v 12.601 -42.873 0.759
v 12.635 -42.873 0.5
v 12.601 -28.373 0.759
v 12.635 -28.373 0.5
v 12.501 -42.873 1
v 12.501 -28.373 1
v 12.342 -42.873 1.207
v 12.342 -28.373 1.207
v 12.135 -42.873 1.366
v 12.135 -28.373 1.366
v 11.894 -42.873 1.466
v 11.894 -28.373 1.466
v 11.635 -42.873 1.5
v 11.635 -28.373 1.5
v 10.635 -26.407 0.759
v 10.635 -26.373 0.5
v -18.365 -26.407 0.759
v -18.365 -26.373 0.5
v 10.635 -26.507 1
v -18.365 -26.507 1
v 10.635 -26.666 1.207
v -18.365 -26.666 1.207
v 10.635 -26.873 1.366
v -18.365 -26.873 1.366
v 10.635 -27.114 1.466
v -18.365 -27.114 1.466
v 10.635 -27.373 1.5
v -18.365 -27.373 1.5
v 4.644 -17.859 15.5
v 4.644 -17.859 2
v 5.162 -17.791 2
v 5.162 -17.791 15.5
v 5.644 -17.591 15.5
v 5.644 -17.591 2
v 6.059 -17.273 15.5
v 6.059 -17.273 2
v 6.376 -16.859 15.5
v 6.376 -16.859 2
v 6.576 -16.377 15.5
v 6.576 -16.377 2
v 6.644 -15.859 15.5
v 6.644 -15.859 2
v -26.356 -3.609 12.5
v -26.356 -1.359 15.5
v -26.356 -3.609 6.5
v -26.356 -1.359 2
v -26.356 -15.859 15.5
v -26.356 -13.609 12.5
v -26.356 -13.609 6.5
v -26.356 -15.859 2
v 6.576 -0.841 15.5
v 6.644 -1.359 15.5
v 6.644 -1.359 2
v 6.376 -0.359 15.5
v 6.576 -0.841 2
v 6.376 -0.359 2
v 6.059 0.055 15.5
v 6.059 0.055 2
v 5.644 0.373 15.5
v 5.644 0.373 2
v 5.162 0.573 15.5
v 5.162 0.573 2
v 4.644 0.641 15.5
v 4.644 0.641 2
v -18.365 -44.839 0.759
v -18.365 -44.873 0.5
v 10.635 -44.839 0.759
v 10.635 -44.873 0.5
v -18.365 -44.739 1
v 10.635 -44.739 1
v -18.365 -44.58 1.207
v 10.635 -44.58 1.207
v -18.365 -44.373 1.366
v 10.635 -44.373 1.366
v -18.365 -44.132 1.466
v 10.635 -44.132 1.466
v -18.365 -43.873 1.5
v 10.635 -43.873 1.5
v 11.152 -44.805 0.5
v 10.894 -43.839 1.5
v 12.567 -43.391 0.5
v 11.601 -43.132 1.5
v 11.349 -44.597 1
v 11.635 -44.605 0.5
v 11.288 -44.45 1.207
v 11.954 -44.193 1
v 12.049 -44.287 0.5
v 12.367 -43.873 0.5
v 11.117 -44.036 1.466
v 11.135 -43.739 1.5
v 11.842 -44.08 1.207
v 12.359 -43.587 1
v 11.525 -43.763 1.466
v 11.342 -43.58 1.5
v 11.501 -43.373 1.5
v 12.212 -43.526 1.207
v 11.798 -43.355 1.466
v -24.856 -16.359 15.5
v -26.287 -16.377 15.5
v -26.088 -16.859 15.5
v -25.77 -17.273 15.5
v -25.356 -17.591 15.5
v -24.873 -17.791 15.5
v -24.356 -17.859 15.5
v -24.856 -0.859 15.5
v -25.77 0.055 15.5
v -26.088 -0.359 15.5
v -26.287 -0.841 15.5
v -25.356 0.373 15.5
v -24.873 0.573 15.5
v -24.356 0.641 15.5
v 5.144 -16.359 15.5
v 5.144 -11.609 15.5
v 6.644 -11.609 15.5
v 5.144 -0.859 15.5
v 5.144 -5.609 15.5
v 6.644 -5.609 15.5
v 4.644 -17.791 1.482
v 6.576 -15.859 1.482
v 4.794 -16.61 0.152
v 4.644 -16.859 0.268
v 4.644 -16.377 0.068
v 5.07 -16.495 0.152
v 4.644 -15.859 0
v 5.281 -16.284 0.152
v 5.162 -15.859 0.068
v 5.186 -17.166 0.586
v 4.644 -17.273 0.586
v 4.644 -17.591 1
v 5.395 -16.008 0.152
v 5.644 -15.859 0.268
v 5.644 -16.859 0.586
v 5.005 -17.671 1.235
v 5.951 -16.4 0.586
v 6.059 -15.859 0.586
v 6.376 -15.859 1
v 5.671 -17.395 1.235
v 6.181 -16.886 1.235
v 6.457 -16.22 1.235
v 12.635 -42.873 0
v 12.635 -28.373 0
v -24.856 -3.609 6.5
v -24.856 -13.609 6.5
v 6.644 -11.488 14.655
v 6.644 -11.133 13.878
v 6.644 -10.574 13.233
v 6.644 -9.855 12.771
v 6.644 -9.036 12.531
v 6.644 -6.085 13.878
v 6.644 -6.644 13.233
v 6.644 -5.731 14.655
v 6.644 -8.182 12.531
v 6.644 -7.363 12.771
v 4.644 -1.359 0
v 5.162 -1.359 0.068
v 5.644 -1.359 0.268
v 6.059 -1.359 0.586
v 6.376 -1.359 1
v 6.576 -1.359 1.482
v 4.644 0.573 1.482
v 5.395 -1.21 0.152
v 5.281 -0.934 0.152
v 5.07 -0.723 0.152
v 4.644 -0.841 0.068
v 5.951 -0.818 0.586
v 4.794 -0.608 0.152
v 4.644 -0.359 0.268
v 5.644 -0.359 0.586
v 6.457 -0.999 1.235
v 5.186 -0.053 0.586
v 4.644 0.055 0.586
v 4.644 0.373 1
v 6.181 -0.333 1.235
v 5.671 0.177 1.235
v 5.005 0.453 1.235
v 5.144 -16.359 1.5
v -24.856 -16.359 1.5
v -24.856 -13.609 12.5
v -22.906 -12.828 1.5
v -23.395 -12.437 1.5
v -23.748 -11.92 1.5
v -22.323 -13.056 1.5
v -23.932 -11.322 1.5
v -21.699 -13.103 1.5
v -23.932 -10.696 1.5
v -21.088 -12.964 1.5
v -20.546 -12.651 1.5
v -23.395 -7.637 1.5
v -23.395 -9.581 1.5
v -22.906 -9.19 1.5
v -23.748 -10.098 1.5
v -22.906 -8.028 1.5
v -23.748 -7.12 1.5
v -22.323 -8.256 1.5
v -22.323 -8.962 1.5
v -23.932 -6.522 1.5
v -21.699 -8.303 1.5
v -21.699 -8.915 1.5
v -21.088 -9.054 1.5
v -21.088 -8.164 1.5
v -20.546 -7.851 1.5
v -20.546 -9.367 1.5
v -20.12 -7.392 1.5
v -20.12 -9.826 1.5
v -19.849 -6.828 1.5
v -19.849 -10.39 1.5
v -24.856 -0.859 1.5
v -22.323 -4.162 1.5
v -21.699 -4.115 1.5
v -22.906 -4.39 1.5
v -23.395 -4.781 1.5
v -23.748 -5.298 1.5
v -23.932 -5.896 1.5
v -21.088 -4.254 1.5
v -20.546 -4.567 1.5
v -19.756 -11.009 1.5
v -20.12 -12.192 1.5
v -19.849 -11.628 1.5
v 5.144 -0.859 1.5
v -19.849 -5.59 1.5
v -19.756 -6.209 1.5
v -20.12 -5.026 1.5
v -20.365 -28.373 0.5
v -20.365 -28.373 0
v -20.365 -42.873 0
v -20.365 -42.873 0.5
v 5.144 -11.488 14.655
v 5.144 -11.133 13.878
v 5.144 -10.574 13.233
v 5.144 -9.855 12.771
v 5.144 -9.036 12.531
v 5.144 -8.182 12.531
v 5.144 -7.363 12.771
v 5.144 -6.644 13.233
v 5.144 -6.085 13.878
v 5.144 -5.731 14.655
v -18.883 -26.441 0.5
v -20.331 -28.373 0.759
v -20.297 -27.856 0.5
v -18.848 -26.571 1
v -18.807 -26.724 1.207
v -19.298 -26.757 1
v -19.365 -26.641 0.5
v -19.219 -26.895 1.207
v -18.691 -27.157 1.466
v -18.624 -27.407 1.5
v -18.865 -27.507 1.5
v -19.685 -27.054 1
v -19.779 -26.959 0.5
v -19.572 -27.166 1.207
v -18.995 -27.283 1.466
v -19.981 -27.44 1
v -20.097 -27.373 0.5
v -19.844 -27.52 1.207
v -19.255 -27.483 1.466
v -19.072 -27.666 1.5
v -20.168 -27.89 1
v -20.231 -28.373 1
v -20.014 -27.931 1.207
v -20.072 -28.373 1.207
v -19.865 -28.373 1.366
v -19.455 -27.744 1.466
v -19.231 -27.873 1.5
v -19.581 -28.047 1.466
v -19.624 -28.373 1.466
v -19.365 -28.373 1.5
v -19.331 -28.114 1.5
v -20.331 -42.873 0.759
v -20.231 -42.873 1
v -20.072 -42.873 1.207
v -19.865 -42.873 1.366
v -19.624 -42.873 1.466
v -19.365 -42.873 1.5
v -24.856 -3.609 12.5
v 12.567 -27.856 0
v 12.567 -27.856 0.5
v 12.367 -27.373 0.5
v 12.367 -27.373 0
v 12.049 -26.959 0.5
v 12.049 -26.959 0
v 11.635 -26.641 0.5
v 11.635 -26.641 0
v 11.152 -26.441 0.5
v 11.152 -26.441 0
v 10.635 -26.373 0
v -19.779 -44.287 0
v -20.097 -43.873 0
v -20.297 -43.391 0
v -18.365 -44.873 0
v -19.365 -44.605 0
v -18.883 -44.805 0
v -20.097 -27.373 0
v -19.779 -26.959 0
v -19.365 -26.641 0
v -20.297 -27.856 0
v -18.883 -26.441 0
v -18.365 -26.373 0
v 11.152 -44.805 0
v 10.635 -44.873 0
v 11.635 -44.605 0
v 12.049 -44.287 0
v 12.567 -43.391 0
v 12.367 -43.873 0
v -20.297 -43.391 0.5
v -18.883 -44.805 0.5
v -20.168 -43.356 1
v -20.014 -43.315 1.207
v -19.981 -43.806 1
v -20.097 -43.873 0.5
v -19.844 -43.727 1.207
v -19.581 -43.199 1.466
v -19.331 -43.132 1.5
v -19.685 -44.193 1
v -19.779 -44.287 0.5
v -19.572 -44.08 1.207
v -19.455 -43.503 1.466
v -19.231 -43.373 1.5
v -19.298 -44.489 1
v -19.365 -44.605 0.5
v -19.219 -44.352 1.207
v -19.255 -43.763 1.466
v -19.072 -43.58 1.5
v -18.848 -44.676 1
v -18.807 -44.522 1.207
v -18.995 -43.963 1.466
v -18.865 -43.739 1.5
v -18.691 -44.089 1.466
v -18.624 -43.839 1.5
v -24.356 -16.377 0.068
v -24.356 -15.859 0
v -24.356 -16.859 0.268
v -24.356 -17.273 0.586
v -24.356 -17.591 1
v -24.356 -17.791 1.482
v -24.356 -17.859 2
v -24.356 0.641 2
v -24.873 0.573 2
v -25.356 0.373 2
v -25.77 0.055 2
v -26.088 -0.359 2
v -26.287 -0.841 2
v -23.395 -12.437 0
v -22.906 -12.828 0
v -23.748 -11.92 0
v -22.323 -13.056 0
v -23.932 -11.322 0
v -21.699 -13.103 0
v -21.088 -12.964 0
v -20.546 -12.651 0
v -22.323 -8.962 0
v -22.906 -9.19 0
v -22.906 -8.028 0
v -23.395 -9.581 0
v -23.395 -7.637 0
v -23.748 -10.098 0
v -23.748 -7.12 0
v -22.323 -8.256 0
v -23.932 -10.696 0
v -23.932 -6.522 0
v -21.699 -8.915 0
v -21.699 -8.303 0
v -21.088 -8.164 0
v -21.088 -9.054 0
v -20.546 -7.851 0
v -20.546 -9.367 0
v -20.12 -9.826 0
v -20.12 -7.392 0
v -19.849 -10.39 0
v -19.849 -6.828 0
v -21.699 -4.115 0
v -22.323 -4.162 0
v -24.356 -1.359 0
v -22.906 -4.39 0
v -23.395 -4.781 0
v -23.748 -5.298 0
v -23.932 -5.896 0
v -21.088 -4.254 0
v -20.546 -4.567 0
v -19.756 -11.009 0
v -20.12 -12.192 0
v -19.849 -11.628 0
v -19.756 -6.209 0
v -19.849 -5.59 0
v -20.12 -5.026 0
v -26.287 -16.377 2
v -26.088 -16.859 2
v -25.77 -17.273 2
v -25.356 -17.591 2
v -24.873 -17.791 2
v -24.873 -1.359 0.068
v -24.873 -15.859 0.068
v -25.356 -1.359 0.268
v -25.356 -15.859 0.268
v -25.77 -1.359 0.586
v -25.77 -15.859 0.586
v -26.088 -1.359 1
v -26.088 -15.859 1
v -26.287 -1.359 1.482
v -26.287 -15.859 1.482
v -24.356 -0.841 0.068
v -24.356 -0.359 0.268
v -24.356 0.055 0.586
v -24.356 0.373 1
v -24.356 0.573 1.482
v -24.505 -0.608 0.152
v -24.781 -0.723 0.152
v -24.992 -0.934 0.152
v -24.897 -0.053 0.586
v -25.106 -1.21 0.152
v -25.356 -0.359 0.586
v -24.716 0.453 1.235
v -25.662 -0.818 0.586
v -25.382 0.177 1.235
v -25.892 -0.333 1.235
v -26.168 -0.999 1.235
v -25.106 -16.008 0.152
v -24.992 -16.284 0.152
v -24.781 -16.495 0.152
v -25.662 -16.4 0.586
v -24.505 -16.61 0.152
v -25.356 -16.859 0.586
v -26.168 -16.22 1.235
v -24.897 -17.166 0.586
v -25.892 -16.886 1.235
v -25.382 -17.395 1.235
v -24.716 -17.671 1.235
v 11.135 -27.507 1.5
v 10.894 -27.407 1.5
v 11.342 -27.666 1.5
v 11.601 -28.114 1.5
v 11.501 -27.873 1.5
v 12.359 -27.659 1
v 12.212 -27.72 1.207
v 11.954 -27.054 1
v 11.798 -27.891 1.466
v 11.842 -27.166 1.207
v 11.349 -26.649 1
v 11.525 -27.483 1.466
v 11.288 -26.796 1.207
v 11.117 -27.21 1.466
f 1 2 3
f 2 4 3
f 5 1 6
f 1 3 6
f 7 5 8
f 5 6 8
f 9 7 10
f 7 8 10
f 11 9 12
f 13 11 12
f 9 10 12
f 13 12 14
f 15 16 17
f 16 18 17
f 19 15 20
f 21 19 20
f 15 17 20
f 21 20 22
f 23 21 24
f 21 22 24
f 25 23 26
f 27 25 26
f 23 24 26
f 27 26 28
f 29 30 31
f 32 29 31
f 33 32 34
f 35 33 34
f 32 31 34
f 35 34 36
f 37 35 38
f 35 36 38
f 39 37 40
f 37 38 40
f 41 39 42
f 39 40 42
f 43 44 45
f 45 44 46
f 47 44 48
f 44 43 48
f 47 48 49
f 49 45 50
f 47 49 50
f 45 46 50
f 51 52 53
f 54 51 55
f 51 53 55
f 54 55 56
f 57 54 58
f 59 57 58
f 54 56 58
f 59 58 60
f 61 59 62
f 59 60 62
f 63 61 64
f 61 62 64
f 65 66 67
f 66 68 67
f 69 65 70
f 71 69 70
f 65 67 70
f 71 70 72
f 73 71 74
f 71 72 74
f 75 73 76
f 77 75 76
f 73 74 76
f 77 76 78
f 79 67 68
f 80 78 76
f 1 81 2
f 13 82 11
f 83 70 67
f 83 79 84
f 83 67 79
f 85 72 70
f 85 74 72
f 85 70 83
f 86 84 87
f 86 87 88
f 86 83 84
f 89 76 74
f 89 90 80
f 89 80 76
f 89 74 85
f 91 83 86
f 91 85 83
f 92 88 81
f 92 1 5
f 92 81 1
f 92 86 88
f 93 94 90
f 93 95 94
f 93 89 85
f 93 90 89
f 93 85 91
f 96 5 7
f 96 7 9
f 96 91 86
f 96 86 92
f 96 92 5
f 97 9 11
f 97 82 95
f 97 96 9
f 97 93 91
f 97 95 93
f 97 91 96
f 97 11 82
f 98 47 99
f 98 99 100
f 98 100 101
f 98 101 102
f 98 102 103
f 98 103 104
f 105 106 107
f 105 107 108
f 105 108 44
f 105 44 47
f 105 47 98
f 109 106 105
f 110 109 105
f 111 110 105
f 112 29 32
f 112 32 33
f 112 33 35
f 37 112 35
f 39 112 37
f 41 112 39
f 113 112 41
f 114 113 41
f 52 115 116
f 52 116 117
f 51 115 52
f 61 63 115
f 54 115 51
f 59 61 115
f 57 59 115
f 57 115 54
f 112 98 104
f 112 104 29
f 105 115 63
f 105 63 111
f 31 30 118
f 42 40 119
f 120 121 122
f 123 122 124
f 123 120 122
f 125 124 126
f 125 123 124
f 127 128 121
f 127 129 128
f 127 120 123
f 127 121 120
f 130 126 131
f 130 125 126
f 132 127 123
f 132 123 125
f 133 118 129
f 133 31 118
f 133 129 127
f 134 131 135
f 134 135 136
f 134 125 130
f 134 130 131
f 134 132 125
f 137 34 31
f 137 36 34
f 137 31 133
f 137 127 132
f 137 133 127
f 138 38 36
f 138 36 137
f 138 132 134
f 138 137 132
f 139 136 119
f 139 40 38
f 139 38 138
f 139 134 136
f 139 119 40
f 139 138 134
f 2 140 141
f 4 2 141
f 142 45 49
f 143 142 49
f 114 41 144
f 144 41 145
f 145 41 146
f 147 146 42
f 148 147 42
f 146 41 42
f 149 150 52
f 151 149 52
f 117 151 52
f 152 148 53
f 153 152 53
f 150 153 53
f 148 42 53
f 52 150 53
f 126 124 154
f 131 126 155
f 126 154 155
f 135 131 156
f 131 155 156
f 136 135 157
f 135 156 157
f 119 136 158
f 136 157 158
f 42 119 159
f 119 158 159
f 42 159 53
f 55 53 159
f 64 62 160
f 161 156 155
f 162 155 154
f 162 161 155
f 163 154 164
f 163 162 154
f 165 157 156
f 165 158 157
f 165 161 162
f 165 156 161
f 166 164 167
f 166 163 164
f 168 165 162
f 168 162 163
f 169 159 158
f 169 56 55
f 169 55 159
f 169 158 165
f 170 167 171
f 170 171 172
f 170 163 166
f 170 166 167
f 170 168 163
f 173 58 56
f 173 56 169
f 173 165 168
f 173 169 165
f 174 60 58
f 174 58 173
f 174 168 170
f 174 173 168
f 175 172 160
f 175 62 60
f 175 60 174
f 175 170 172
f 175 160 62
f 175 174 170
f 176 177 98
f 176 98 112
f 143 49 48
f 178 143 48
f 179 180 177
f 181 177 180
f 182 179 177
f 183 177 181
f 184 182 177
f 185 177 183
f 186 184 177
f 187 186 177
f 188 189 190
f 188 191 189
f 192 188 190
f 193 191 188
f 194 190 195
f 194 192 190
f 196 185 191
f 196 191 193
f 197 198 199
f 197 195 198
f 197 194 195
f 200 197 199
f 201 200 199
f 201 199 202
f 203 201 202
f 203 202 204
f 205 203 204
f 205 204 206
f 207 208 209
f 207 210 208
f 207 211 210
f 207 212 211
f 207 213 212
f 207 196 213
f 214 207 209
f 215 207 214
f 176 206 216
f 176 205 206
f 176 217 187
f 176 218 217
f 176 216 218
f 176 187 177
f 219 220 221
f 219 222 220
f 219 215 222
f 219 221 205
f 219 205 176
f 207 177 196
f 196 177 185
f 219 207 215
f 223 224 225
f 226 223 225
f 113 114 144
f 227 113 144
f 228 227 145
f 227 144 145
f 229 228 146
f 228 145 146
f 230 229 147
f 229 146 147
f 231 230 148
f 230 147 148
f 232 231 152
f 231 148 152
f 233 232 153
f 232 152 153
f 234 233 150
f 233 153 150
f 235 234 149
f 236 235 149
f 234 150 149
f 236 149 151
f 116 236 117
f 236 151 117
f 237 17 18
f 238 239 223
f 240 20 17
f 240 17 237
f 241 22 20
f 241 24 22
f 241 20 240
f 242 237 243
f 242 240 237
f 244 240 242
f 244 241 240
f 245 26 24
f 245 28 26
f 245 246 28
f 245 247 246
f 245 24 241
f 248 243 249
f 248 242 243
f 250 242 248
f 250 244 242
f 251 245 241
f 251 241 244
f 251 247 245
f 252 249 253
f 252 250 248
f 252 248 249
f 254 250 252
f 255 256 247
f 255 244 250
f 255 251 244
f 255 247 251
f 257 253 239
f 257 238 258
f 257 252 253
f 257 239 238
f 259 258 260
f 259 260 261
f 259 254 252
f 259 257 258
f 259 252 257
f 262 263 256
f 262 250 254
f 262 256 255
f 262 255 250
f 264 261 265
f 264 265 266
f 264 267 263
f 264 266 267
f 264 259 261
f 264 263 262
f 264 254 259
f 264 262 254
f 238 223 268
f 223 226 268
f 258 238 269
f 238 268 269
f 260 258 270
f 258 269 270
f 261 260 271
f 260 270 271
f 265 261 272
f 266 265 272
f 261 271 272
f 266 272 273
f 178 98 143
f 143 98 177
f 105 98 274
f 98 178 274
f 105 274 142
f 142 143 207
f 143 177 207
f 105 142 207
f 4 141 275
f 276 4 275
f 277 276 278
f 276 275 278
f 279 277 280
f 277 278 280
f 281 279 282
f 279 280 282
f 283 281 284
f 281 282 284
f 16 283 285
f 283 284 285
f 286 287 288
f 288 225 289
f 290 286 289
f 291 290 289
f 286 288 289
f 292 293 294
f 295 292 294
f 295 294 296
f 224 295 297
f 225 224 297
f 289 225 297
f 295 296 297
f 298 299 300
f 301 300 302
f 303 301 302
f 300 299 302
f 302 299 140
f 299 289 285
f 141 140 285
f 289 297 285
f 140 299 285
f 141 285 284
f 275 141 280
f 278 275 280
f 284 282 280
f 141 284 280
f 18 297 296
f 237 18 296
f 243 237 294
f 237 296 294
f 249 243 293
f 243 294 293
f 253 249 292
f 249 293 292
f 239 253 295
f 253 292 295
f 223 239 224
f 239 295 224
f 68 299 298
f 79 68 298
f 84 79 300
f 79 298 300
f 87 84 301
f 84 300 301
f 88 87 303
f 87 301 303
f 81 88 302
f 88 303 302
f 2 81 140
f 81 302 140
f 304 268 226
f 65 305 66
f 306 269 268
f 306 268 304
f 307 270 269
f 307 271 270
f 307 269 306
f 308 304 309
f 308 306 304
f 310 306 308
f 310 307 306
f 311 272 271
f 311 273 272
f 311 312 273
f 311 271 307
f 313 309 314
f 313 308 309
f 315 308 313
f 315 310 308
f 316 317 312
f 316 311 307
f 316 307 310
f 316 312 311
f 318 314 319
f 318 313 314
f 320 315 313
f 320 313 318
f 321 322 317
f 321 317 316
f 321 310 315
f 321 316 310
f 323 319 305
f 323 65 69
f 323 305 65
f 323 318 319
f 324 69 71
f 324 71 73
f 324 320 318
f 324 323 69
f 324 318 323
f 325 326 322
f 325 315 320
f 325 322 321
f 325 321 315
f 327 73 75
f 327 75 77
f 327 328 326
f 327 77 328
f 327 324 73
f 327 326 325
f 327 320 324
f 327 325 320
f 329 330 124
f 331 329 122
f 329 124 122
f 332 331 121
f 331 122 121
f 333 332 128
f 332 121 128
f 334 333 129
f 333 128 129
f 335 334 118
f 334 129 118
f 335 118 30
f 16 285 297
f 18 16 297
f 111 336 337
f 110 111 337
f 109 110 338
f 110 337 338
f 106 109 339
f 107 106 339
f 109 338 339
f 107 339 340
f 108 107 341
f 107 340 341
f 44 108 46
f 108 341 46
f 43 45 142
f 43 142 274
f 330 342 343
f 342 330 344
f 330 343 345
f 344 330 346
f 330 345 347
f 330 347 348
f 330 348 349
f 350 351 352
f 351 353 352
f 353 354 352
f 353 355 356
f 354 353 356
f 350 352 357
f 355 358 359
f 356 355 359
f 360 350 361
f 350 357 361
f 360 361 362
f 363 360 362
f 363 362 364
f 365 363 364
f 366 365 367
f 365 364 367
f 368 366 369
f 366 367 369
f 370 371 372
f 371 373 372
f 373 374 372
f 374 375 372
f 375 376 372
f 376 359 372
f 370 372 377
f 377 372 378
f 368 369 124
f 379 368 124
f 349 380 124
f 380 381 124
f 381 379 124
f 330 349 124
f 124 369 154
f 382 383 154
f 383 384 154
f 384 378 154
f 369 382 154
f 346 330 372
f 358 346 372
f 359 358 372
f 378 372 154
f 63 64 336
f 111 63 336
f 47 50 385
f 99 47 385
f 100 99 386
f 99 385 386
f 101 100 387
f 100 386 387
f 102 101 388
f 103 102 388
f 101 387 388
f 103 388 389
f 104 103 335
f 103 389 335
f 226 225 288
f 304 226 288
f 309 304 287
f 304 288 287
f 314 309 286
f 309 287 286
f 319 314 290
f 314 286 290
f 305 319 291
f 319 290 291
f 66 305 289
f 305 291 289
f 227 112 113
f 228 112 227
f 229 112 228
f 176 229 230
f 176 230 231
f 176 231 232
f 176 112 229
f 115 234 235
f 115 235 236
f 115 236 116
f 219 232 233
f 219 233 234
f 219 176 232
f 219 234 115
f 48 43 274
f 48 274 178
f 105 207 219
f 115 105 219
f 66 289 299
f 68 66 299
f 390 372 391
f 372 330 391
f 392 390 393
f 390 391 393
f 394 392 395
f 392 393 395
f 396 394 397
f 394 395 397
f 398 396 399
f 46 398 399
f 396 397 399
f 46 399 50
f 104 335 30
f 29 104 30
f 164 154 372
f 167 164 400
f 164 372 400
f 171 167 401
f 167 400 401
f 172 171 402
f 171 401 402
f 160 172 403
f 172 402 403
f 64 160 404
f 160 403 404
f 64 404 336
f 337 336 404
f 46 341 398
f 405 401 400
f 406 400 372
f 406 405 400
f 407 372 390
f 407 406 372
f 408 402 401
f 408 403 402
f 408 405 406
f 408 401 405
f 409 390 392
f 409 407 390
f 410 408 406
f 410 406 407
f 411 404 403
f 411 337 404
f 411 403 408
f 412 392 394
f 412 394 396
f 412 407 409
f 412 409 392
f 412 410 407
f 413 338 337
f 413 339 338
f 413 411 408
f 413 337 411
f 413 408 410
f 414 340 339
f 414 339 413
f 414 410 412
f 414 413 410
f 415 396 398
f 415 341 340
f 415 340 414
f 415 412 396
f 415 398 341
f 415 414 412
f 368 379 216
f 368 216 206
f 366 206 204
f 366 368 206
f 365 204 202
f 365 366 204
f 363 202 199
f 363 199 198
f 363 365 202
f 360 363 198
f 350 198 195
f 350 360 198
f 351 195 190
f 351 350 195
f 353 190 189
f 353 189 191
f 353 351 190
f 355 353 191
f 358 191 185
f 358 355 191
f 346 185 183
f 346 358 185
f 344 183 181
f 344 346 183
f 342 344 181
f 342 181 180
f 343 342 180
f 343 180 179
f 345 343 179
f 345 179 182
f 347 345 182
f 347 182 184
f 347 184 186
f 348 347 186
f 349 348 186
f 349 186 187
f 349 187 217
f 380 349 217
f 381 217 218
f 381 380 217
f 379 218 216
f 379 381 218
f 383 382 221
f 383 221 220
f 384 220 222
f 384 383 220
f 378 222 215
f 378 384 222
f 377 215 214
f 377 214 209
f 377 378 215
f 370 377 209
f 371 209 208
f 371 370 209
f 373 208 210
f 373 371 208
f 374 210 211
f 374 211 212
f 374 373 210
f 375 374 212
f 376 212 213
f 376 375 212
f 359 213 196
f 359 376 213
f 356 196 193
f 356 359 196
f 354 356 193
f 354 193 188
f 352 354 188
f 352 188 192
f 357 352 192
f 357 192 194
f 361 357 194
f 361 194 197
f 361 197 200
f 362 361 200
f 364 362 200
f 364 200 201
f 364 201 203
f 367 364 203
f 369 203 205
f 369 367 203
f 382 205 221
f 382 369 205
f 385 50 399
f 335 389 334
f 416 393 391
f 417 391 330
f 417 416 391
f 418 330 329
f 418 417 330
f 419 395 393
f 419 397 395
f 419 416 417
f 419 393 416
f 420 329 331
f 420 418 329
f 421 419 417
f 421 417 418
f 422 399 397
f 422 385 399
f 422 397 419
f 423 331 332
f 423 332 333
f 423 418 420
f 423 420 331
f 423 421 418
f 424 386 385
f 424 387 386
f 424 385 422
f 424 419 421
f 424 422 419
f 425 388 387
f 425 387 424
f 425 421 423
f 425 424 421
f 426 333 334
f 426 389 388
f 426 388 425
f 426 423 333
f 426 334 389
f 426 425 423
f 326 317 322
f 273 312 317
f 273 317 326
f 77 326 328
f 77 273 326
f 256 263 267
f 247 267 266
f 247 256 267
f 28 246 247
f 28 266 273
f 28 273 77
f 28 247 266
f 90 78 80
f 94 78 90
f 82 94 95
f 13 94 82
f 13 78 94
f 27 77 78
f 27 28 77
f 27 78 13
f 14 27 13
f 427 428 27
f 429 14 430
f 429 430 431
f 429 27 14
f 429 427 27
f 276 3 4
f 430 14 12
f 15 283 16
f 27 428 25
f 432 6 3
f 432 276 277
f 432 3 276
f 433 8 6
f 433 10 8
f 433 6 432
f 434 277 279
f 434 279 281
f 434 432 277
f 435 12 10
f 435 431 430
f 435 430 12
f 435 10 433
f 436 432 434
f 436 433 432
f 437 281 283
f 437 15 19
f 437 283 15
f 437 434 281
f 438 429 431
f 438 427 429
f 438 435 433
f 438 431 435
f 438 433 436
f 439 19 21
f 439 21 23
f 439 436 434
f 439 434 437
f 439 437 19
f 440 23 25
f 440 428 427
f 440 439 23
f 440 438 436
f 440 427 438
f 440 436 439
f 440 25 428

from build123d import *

# Parameters (mm, degrees)
F0_W      = 30
F0_H      = 15.5
F1_DEPTH  = 15.5
F0_R      = 2.1
F2_DEPTH  = 1.5
F3_W      = 10
F3_H      = 6
F4_DEPTH  = 2
F6_DEPTH  = 1.5
F7_R      = 1
F8_R      = 2
F10_DEPTH = 2


with BuildPart() as f1:
    # F0 (on Top) → F1 (new body)
    with BuildSketch(Plane.XY):
        with BuildLine():
            Line((-26.3555888087, -1.3590702893), (-26.3555888087, -15.8590702893))
            ThreePointArc((-26.3555888087, -15.8590702893), (-25.769802371, -17.2732838517), (-24.3555888087, -17.8590702893))
            Line((-24.3555888087, -17.8590702893), (4.6444111913, -17.8590702893))
            ThreePointArc((4.6444111913, -17.8590702893), (6.0586247537, -17.2732838517), (6.6444111913, -15.8590702893))
            Line((6.6444111913, -15.8590702893), (6.6444111913, -1.3590702893))
            ThreePointArc((6.6444111913, -1.3590702893), (6.0586247537, 0.0551432731), (4.6444111913, 0.6409297107))
            Line((4.6444111913, 0.6409297107), (-24.3555888087, 0.6409297107))
            ThreePointArc((-24.3555888087, 0.6409297107), (-25.769802371, 0.0551432731), (-26.3555888087, -1.3590702893))
        make_face()
        with Locations((-9.8555888087, -8.6090702893)):
            Rectangle(F0_W, F0_H, mode=Mode.SUBTRACT)
    extrude(amount=F1_DEPTH)

    # F0 (on Top) → F2 (join)
    with BuildSketch(Plane.XY):
        with Locations((-9.8555888087, -8.6090702893)):
            Rectangle(F0_W, F0_H)
        with Locations((-21.8555888087, -11.0090702893)):
            Circle(F0_R, mode=Mode.SUBTRACT)
        with Locations((-21.8555888087, -6.2090702893)):
            Circle(F0_R, mode=Mode.SUBTRACT)
    extrude(amount=F2_DEPTH)

    # F3 (on face) → F4 (cut)
    with BuildSketch(Plane(origin=(-26.3555888087, 0, 0), x_dir=(0, -1, 0), z_dir=(-1, 0, 0))):
        with Locations((8.6090702893, 9.5)):
            Rectangle(F3_W, F3_H)
    extrude(amount=-F4_DEPTH, mode=Mode.SUBTRACT)

    # F8
    f8_edges = [f1.edges().sort_by_distance(p)[0] for p in [
        (-26.355589, -8.60907, 0),
        (-9.855589, 0.64093, 0),
        (6.644411, -8.60907, 0),
        (-9.855589, -17.85907, 0),
        (6.058625, -17.273284, 0),
        (6.058625, 0.055143, 0),
        (-25.769802, 0.055143, 0),
        (-25.769802, -17.273284, 0),
    ]]
    fillet(f8_edges, radius=F8_R)

    # F9 (on face) → F10 (cut)
    with BuildSketch(Plane.YZ.offset(6.6444111913)):
        with BuildLine():
            ThreePointArc((-11.6090702893, 15.5), (-8.6090702893, 12.5), (-5.6090702893, 15.5))
            Line((-5.6090702893, 15.5), (-11.6090702893, 15.5))
        make_face()
    extrude(amount=-F10_DEPTH, mode=Mode.SUBTRACT)


with BuildPart() as f6:
    # F5 (on Top) → F6 (new body)
    with BuildSketch(Plane.XY):
        with BuildLine():
            Line((10.6348033845, -26.3732144807), (-18.3651966155, -26.3732144807))
            ThreePointArc((-18.3651966155, -26.3732144807), (-19.7794101778, -26.9590009183), (-20.3651966155, -28.3732144807))
            Line((-20.3651966155, -28.3732144807), (-20.3651966155, -42.8732144807))
            ThreePointArc((-20.3651966155, -42.8732144807), (-19.7794101778, -44.2874280431), (-18.3651966155, -44.8732144807))
            Line((-18.3651966155, -44.8732144807), (10.6348033845, -44.8732144807))
            ThreePointArc((10.6348033845, -44.8732144807), (12.0490169469, -44.2874280431), (12.6348033845, -42.8732144807))
            Line((12.6348033845, -42.8732144807), (12.6348033845, -28.3732144807))
            ThreePointArc((12.6348033845, -28.3732144807), (12.0490169469, -26.9590009183), (10.6348033845, -26.3732144807))
        make_face()
    extrude(amount=F6_DEPTH)

    # F7
    f7_edges = [f6.edges().sort_by_distance(p)[0] for p in [
        (-3.865197, -44.873214, 1.5),
    ]]
    fillet(f7_edges, radius=F7_R)


solid = Compound([f1.part, f6.part])
